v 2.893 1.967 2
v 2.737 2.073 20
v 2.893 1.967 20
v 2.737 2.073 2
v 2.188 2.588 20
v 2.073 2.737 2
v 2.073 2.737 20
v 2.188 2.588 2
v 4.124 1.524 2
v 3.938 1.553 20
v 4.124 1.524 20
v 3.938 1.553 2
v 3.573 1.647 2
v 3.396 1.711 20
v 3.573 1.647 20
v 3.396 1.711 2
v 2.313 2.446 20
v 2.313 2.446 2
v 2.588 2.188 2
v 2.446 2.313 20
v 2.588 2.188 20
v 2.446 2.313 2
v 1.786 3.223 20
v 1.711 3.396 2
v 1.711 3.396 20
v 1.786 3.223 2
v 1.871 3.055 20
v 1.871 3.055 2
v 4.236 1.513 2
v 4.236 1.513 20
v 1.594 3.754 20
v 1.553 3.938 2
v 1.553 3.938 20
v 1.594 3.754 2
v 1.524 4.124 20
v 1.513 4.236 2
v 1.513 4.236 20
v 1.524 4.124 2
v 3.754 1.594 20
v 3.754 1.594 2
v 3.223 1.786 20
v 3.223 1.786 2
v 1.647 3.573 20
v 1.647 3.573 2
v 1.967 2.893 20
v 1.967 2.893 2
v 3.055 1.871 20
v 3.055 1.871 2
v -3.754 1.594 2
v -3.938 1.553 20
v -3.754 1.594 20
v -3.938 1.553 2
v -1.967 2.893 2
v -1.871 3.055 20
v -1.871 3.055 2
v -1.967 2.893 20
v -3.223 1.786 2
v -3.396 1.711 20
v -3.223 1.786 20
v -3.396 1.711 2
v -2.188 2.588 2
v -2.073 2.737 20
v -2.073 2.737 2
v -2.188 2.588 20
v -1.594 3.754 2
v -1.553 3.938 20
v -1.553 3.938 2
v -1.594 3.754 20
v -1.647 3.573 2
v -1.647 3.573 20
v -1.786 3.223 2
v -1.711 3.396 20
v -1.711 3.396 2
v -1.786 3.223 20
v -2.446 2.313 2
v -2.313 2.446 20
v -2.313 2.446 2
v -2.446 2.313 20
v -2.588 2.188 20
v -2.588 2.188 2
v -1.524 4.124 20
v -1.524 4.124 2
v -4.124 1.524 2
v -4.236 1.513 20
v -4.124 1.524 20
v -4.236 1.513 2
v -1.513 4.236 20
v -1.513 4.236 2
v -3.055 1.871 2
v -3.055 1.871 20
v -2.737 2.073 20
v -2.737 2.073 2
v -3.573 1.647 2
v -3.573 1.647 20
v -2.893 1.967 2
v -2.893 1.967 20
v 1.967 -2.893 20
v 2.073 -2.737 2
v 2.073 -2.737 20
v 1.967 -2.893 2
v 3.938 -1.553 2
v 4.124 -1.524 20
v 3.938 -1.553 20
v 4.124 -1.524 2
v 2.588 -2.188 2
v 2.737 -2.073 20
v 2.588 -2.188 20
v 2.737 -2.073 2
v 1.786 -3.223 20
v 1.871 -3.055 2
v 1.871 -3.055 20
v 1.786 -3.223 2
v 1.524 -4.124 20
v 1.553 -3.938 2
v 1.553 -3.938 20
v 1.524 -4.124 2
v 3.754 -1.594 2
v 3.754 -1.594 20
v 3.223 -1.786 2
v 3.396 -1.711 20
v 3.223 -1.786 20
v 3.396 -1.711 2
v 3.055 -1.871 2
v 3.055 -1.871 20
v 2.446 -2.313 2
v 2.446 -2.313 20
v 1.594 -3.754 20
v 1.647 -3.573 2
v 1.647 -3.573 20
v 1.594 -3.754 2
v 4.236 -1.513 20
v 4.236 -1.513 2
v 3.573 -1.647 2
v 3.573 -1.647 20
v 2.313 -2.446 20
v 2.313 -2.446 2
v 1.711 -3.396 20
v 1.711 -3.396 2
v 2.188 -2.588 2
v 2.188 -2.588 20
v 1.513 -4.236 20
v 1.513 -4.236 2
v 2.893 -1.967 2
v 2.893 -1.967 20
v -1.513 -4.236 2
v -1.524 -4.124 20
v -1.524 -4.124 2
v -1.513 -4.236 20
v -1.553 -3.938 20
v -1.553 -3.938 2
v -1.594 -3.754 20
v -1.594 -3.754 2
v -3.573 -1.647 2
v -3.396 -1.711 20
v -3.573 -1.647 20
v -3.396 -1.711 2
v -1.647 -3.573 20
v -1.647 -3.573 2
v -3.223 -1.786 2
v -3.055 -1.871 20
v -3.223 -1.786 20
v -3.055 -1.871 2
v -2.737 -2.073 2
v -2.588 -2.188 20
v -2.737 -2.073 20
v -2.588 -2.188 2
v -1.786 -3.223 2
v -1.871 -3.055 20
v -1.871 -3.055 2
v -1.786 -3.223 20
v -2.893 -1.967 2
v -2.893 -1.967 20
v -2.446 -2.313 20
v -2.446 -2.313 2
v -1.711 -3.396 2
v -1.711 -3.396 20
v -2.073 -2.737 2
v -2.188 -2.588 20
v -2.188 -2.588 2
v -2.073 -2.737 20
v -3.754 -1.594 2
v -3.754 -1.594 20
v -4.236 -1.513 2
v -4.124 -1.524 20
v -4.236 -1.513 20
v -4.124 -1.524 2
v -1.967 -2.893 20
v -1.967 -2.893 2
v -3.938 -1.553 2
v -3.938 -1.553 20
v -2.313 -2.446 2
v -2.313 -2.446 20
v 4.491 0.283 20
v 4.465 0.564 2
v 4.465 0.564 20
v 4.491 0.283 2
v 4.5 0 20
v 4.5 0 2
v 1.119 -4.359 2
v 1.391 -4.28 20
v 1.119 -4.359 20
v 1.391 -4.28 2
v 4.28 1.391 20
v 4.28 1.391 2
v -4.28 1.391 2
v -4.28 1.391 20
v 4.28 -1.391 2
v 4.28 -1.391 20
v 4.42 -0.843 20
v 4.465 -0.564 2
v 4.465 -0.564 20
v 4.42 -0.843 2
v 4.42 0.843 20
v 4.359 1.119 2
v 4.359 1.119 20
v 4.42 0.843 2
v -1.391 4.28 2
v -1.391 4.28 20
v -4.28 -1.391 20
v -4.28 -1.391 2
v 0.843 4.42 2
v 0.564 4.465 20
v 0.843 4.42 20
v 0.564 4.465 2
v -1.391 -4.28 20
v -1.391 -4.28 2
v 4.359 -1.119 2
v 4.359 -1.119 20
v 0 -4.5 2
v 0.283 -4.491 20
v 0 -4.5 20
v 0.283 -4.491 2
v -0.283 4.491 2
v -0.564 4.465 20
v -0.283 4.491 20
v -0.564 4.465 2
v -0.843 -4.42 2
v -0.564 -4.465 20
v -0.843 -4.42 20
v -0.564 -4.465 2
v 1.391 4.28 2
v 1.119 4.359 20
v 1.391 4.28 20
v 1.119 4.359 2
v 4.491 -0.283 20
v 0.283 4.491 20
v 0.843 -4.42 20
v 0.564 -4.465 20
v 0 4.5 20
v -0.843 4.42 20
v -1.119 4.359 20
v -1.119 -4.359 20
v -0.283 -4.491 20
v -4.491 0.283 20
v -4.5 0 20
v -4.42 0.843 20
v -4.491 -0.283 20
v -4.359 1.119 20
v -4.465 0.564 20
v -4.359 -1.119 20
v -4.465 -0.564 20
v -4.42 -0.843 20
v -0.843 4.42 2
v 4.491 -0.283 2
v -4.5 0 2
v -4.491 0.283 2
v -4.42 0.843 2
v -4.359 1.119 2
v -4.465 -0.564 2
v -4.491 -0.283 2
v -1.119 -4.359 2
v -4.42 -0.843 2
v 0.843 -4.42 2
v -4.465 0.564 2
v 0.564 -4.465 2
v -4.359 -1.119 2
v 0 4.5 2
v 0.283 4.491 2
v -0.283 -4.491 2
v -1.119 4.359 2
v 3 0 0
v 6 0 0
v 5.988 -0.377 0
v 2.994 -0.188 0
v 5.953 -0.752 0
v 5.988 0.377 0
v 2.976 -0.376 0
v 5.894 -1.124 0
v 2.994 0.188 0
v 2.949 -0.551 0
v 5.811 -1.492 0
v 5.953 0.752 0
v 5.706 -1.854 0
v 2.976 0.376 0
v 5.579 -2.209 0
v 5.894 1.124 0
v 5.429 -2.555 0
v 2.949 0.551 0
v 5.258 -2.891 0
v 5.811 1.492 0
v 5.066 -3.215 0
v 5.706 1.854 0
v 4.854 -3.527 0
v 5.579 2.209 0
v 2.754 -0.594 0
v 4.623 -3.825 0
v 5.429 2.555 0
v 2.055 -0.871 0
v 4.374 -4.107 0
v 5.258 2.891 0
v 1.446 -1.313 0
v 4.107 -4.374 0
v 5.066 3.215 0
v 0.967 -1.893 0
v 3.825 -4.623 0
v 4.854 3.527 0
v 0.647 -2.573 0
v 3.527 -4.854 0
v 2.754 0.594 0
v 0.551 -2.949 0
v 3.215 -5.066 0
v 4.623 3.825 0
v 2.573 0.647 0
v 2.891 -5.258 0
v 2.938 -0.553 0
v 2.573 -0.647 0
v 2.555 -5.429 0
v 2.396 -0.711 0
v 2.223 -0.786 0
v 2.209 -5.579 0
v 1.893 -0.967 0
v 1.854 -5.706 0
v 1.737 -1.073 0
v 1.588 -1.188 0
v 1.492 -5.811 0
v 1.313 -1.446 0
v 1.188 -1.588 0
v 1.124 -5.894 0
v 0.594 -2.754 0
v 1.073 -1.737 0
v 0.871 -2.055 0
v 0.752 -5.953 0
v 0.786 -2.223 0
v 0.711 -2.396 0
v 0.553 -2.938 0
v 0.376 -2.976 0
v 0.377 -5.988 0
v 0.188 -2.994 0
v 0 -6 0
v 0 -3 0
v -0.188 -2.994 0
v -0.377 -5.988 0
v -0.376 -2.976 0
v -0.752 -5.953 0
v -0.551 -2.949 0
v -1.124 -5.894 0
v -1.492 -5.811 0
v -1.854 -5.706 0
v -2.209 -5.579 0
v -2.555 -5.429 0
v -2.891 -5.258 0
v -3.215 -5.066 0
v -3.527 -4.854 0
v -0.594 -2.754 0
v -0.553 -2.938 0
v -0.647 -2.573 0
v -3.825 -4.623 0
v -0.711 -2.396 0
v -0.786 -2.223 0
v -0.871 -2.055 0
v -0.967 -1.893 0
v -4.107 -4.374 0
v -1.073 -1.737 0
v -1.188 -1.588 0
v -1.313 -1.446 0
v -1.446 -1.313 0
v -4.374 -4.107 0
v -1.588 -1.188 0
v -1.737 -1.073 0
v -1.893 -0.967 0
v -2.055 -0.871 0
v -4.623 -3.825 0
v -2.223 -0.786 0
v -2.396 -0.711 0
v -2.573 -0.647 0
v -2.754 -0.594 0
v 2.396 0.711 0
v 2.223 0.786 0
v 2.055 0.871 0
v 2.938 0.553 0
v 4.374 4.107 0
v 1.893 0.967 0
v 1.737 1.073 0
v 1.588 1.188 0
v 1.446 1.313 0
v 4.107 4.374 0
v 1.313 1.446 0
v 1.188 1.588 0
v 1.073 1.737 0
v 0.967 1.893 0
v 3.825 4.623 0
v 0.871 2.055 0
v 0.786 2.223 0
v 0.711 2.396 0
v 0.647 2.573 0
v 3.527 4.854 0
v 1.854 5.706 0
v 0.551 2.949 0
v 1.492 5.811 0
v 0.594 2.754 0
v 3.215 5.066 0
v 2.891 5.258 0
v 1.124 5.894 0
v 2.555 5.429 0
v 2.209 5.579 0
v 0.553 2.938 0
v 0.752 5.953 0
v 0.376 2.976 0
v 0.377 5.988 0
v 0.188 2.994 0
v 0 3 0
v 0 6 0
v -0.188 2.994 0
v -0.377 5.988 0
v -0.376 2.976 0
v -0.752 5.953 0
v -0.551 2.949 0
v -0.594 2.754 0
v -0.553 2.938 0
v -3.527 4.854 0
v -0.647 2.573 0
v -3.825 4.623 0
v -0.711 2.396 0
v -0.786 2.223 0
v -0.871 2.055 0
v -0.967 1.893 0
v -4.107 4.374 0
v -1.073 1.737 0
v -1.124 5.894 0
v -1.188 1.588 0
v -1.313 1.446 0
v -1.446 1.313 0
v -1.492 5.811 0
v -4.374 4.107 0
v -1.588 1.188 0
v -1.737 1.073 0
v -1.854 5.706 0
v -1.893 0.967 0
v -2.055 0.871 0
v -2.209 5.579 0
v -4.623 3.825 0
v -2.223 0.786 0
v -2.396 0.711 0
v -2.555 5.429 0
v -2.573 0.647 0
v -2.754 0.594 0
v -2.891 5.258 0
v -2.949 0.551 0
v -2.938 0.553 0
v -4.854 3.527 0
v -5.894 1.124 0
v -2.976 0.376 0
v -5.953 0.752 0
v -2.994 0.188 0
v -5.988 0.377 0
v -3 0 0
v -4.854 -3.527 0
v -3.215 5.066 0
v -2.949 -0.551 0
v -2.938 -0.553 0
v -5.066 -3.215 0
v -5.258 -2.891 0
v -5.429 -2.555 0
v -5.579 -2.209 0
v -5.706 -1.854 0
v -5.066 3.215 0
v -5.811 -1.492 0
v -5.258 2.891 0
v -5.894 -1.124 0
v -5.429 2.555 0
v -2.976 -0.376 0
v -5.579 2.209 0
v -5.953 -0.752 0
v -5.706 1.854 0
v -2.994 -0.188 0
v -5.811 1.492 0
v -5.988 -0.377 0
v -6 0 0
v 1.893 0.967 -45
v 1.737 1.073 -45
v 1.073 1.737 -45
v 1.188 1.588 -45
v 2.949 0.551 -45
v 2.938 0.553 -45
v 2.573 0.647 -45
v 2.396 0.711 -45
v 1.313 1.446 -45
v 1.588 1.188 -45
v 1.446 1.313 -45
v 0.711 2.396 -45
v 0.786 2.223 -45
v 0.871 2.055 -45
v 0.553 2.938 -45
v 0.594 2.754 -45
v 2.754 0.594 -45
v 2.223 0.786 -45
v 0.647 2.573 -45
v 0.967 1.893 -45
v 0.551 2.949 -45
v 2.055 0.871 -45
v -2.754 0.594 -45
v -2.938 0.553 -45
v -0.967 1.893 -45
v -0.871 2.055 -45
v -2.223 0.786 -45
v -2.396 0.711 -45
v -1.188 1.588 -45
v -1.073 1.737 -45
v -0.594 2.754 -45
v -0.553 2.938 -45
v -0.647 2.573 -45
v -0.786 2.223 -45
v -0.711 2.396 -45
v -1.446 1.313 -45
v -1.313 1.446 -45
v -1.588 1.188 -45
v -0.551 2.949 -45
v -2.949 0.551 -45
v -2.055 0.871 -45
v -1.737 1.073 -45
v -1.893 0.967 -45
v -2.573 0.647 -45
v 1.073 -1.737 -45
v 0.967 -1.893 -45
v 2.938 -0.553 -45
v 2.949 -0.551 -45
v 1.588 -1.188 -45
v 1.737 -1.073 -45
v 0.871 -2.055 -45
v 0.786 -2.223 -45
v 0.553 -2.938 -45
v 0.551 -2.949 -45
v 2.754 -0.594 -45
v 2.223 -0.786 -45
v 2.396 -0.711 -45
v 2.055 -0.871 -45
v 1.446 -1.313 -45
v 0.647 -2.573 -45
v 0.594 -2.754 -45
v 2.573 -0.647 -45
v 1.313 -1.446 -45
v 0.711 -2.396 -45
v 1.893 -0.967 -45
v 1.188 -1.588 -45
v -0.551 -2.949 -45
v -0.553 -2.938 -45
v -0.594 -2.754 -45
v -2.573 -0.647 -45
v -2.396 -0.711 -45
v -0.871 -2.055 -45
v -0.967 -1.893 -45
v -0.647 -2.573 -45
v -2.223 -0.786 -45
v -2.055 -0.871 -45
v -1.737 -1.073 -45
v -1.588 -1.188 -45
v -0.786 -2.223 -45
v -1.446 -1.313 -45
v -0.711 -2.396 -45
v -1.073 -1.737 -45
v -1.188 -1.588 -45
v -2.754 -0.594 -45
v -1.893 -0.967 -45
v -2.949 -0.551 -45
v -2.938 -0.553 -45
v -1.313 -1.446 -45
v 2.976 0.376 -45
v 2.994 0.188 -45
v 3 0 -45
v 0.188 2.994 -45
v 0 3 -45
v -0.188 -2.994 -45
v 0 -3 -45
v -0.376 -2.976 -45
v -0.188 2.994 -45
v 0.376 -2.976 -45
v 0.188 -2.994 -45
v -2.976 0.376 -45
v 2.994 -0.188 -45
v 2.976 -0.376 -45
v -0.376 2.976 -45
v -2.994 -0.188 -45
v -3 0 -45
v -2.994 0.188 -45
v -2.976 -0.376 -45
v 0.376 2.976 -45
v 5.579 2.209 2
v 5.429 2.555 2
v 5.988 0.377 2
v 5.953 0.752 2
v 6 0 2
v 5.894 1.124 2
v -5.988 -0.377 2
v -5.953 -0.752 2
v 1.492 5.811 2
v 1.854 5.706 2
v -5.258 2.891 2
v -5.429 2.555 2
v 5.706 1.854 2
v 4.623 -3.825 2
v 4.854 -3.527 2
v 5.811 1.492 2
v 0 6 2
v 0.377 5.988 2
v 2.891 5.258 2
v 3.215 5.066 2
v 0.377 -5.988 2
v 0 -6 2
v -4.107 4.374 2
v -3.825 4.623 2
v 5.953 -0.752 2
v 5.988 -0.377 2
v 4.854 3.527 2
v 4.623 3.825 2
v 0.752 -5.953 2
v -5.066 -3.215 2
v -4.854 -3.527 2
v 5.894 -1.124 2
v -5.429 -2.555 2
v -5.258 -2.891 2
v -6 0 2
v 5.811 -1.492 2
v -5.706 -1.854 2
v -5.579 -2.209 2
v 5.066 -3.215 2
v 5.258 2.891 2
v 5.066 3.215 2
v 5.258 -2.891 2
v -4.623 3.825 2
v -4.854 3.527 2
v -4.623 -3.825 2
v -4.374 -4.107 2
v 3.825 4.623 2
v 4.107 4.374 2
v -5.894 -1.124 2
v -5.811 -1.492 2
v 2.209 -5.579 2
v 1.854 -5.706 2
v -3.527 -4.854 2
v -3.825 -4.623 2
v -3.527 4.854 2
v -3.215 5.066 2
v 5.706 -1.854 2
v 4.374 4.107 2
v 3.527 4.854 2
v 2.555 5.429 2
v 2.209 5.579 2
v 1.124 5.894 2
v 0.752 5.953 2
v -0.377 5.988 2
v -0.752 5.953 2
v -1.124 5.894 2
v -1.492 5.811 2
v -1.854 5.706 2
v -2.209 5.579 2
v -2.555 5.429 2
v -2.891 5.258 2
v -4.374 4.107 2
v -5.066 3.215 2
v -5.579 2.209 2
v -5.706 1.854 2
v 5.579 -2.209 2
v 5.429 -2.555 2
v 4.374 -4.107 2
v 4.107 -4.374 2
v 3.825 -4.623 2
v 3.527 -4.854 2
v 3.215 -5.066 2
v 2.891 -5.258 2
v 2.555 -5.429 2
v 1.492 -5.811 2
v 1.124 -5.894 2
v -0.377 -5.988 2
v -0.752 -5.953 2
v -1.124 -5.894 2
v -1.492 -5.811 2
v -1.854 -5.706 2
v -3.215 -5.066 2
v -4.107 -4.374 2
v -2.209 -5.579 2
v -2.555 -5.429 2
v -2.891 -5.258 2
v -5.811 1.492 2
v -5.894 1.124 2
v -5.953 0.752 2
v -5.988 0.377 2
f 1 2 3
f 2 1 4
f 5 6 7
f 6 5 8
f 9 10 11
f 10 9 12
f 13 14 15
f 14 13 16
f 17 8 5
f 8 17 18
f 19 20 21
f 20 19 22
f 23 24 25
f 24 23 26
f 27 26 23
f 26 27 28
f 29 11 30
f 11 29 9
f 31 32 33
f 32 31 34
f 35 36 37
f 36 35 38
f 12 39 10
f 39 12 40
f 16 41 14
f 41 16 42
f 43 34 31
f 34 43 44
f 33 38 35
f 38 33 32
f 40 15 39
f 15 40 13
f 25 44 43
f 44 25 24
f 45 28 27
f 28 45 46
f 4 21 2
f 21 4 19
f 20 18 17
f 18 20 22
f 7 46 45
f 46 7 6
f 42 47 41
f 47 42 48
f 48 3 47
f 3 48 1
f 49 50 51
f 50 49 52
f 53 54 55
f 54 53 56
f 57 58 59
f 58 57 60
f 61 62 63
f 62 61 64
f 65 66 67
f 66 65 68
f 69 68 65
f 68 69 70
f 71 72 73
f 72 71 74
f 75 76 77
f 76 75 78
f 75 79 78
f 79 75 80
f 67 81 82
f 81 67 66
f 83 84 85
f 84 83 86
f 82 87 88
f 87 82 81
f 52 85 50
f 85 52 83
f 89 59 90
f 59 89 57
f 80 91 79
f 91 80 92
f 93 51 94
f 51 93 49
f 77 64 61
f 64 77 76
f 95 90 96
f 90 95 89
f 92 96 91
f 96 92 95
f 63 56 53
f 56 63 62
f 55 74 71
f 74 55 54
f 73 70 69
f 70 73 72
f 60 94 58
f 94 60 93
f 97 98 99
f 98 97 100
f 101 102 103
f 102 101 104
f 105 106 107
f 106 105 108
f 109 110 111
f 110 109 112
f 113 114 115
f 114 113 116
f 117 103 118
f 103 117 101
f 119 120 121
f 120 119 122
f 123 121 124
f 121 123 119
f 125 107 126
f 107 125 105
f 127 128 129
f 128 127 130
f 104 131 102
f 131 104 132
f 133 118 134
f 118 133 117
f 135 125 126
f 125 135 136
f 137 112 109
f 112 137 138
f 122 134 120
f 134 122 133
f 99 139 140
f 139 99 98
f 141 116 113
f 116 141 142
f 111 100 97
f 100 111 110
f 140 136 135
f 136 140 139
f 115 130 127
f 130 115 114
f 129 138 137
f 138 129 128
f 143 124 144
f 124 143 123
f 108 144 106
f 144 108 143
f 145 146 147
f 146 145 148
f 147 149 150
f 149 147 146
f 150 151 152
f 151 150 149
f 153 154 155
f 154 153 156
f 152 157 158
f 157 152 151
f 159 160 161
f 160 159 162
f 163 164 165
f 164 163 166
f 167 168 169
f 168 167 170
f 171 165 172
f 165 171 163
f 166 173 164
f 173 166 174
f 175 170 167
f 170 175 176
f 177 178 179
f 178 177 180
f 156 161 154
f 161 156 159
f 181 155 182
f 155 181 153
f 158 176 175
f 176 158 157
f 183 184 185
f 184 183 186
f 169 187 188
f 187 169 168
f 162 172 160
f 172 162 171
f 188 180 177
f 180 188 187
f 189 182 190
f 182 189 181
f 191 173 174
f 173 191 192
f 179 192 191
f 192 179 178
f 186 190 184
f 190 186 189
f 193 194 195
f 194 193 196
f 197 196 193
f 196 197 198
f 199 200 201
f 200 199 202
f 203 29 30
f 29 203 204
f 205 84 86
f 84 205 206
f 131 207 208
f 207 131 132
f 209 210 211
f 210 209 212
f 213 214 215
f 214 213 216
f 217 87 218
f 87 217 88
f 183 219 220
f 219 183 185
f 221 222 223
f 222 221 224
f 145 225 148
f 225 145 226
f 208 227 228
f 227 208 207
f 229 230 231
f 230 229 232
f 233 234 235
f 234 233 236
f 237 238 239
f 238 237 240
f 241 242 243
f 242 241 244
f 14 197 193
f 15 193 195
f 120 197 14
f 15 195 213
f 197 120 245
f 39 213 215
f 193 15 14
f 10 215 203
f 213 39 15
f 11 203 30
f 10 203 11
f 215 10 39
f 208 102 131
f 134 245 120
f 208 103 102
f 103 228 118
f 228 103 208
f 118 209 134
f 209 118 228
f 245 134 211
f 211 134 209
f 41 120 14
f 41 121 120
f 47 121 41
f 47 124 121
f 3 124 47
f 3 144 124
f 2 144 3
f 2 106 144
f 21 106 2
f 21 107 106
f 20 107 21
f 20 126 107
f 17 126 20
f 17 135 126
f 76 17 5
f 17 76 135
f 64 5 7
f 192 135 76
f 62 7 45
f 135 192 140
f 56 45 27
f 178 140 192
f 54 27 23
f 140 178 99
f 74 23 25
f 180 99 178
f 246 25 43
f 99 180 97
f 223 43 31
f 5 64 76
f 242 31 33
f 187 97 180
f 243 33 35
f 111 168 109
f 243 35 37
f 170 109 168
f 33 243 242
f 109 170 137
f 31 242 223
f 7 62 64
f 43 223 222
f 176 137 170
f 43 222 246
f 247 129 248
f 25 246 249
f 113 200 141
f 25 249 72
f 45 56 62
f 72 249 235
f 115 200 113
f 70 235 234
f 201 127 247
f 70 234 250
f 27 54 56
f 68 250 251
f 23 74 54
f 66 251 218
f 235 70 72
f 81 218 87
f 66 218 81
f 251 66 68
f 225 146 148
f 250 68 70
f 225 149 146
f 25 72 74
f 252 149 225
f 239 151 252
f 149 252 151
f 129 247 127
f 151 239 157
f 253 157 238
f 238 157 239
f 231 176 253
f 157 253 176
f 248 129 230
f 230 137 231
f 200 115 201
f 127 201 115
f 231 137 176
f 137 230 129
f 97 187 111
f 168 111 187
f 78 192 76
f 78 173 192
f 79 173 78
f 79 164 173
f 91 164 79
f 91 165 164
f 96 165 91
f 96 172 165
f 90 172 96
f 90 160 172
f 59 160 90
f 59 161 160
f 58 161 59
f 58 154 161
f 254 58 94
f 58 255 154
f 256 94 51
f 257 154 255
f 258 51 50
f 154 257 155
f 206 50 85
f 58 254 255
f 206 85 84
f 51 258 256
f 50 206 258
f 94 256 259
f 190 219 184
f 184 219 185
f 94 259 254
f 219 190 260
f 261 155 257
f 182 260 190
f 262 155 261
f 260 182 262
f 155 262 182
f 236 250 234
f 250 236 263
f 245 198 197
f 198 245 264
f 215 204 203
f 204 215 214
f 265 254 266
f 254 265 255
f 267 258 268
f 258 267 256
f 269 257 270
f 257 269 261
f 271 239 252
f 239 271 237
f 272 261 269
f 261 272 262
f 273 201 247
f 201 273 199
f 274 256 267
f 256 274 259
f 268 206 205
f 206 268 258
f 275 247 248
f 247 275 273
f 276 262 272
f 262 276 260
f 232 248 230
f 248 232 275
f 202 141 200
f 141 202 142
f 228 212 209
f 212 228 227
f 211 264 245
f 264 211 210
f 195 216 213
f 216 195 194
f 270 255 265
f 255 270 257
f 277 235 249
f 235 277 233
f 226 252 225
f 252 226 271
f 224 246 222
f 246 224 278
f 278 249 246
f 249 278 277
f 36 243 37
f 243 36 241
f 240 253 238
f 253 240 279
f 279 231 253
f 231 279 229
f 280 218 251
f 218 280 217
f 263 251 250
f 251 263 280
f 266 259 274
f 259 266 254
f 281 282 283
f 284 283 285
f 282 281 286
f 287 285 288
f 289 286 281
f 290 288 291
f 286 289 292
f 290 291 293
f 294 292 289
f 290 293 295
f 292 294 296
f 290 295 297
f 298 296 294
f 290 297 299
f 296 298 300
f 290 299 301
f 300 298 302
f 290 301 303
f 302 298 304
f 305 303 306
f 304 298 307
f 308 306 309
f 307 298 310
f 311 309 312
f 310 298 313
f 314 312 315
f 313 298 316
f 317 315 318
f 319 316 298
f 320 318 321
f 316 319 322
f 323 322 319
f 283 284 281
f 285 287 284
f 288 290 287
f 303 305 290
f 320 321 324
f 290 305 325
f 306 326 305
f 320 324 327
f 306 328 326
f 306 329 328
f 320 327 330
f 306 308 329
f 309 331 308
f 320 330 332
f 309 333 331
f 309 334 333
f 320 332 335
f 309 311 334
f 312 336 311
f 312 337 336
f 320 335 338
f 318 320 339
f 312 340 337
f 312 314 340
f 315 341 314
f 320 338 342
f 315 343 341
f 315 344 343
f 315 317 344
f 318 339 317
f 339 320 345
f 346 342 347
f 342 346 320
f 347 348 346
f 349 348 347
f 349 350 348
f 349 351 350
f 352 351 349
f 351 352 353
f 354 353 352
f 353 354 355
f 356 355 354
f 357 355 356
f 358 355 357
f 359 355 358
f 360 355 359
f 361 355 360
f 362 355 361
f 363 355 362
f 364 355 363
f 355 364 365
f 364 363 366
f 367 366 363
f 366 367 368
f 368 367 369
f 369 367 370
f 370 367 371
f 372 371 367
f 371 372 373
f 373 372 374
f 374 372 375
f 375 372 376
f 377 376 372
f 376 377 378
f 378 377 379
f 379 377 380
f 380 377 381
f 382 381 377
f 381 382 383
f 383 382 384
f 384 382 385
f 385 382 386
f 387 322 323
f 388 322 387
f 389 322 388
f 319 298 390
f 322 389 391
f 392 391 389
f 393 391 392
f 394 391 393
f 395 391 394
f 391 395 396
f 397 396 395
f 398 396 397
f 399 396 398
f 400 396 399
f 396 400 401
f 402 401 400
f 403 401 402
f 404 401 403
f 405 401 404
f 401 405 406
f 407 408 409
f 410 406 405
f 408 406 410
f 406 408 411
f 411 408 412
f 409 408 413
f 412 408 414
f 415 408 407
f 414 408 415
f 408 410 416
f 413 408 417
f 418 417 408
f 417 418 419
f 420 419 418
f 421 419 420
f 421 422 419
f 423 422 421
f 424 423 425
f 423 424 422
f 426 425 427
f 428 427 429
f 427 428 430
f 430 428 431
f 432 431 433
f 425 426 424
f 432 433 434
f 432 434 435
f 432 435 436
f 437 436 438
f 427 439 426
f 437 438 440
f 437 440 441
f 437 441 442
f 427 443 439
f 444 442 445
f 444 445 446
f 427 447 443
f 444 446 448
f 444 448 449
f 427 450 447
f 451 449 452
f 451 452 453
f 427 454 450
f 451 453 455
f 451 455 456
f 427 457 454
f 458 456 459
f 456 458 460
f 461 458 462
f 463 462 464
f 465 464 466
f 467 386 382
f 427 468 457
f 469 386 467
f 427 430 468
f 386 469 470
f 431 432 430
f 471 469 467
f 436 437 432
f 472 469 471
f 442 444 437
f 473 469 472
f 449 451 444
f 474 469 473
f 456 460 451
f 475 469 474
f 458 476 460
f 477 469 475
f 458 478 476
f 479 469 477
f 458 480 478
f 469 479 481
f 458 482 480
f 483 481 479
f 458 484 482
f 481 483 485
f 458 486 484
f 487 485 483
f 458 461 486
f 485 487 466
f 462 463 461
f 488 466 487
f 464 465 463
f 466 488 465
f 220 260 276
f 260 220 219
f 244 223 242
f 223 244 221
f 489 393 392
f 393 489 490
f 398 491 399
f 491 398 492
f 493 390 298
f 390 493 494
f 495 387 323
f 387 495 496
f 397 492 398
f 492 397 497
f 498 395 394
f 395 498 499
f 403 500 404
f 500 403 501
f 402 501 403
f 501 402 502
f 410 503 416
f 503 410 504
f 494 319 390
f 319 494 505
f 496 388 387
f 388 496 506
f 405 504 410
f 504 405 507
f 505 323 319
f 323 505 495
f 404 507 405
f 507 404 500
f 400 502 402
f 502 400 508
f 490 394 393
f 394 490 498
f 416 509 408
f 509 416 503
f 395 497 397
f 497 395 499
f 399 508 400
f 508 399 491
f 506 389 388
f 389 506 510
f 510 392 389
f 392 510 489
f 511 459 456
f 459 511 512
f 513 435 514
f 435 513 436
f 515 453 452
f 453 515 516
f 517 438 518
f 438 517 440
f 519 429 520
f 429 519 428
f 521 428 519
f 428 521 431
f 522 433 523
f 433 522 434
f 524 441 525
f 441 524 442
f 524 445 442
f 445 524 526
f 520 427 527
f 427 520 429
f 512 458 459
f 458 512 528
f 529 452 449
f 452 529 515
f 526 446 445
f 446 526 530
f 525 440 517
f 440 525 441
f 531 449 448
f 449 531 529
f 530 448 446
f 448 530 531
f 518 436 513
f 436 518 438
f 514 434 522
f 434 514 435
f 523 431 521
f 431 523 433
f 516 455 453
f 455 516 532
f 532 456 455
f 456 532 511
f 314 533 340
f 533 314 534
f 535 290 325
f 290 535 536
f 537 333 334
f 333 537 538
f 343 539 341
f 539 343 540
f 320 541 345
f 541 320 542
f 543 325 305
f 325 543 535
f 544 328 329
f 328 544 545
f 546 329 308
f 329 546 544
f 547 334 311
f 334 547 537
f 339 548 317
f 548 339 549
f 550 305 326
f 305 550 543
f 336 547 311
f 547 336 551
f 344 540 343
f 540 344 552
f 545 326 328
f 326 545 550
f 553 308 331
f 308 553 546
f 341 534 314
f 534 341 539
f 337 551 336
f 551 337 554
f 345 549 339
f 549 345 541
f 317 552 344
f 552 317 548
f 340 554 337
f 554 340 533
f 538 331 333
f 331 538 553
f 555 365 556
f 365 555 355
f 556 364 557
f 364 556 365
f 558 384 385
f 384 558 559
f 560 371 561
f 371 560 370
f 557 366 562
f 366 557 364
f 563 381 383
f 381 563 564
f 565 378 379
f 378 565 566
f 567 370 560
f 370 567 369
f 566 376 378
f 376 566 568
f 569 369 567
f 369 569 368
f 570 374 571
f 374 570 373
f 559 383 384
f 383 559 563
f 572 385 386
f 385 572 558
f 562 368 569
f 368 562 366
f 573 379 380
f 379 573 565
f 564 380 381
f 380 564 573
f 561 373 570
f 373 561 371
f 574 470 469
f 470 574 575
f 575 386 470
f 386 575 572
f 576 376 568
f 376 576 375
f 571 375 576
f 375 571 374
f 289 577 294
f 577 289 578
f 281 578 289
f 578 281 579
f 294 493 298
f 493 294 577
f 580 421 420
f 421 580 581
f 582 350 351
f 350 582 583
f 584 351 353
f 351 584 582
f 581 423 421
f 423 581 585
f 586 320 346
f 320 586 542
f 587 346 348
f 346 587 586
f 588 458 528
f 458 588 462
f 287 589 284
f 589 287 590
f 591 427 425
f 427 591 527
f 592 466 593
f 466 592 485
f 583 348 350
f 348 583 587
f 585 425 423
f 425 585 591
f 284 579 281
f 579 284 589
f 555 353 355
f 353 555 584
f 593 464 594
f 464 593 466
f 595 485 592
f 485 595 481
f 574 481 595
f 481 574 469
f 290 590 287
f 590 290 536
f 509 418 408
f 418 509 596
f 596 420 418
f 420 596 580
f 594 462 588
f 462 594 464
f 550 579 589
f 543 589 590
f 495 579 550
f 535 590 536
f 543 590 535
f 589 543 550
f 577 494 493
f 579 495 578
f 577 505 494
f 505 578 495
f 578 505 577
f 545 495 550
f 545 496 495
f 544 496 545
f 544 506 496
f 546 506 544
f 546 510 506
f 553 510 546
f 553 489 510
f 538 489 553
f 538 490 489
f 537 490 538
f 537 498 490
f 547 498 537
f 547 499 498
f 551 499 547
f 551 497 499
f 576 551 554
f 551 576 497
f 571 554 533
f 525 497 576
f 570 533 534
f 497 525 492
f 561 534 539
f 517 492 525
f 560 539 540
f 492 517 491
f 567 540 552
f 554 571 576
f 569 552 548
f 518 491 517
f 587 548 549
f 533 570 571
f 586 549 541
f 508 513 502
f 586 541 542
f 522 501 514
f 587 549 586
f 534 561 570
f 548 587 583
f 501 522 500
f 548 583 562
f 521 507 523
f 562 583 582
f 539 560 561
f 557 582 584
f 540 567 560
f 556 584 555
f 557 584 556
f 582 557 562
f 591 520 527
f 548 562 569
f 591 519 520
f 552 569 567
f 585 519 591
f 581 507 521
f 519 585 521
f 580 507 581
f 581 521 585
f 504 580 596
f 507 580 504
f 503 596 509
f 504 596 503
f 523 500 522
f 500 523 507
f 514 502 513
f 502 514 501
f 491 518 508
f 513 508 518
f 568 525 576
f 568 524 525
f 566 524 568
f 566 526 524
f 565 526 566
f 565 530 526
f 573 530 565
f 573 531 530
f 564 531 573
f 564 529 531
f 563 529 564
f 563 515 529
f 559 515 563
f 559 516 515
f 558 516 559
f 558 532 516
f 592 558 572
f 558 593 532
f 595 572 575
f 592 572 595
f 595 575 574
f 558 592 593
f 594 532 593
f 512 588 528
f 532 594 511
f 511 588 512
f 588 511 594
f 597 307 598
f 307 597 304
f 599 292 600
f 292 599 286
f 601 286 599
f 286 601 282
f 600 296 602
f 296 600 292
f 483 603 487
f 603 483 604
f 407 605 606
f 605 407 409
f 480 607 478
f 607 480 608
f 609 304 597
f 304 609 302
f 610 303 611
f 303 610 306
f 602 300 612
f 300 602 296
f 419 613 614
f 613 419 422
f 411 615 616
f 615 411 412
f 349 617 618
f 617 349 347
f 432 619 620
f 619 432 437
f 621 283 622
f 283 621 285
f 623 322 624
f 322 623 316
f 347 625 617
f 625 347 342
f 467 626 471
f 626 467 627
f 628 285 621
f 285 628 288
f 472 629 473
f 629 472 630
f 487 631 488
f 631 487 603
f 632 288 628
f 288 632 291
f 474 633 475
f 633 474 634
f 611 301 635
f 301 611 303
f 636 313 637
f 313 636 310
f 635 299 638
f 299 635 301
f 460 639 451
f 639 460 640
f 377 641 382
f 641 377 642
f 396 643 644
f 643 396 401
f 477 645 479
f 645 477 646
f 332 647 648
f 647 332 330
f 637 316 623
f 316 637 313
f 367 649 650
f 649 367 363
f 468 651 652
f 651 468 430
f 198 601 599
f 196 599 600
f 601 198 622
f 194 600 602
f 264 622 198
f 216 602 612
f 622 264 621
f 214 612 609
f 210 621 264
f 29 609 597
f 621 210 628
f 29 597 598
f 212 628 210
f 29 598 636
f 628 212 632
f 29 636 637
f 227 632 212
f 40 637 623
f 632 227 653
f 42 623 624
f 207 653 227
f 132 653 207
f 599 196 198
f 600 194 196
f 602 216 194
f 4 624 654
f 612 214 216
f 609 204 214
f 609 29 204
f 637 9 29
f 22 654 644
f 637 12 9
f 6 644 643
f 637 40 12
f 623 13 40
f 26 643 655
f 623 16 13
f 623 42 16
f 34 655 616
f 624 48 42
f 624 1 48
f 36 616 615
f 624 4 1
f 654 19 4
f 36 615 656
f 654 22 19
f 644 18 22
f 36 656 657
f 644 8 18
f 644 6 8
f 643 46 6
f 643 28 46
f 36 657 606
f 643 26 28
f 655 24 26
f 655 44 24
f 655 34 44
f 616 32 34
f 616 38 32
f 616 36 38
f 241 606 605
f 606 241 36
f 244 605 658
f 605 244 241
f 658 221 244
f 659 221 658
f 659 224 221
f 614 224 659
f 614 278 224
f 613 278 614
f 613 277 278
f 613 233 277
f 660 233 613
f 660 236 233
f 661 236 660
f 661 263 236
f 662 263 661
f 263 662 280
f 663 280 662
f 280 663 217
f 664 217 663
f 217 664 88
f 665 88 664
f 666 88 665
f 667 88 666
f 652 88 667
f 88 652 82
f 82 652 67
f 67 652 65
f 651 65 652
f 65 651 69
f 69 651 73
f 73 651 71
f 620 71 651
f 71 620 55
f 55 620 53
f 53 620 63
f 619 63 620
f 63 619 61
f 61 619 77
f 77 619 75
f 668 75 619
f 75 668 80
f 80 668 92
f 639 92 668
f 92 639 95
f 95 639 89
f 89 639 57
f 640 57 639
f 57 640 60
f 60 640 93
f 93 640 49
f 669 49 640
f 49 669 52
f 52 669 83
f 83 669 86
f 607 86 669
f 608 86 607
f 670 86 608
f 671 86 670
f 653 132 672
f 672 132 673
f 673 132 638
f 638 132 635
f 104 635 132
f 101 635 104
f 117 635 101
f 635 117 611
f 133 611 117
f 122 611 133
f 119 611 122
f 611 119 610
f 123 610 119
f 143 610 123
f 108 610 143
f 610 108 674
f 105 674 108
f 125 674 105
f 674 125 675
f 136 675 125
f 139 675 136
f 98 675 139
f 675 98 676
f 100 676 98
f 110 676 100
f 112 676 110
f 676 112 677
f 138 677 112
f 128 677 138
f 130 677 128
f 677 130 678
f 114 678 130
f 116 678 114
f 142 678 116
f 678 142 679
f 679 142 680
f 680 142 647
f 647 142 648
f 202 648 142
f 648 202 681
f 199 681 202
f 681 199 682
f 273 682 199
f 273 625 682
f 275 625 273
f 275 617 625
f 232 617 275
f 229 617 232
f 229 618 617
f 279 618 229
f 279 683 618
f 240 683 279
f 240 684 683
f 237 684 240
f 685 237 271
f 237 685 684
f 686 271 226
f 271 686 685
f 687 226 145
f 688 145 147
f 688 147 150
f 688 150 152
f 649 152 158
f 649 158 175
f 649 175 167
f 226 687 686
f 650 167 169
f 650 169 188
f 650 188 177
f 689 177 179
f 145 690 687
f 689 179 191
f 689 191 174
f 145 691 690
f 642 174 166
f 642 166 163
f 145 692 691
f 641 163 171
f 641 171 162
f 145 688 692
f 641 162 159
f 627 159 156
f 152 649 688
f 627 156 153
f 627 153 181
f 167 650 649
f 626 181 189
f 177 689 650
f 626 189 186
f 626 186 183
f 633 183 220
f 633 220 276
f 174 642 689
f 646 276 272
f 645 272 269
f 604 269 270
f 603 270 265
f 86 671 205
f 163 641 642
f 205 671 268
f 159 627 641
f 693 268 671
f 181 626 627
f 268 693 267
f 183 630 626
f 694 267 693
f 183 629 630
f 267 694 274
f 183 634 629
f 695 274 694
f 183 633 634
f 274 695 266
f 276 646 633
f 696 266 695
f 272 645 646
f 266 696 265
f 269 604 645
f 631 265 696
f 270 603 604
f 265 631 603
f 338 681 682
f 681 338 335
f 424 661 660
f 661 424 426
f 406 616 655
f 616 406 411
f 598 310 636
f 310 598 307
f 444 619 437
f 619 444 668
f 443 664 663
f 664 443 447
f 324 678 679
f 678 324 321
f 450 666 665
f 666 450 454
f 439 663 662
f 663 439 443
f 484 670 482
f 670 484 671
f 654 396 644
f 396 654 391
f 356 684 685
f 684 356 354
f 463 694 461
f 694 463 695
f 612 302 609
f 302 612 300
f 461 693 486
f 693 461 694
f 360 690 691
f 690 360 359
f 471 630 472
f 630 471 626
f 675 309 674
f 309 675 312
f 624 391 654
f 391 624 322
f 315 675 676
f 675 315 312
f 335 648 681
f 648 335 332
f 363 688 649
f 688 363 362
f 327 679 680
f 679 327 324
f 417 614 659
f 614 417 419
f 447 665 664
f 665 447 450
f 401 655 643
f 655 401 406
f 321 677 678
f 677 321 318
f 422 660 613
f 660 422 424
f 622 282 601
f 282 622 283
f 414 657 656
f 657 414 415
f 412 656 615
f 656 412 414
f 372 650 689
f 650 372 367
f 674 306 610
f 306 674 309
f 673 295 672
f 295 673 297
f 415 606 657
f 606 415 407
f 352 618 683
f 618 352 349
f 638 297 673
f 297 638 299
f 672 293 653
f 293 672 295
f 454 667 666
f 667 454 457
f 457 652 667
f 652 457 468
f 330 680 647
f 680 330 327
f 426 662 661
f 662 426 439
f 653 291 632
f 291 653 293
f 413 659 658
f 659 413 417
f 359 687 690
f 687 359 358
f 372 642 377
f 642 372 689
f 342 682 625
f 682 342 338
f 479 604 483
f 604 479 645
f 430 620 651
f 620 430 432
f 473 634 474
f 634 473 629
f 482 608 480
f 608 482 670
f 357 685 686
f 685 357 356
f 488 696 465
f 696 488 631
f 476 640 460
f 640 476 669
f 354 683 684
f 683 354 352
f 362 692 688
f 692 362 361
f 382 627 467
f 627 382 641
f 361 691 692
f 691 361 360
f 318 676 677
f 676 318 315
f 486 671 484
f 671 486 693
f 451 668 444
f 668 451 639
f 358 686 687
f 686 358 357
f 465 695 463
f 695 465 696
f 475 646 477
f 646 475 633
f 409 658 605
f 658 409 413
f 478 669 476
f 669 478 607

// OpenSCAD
$fn=100;
cylinder(2,6,6);


difference(){
        translate([0,0,0]) {
            cylinder(20, 4.5, 4.5);
        }
        k = 4.5;
        for(i = [[k,k],[-k,k],[k,-k],[-k,-k]]){
            translate([i[0], i[1], -1])
                cylinder(60, 3, 3);
        }
}
difference(){
        translate([0,0,-45]) {
            cylinder(45, 3, 3);
        }
        k = 3.5;
        for(i = [[k,k],[-k,k],[k,-k],[-k,-k]]){
            translate([i[0], i[1], -48])
                cylinder(50, 3, 3);
        }
}
